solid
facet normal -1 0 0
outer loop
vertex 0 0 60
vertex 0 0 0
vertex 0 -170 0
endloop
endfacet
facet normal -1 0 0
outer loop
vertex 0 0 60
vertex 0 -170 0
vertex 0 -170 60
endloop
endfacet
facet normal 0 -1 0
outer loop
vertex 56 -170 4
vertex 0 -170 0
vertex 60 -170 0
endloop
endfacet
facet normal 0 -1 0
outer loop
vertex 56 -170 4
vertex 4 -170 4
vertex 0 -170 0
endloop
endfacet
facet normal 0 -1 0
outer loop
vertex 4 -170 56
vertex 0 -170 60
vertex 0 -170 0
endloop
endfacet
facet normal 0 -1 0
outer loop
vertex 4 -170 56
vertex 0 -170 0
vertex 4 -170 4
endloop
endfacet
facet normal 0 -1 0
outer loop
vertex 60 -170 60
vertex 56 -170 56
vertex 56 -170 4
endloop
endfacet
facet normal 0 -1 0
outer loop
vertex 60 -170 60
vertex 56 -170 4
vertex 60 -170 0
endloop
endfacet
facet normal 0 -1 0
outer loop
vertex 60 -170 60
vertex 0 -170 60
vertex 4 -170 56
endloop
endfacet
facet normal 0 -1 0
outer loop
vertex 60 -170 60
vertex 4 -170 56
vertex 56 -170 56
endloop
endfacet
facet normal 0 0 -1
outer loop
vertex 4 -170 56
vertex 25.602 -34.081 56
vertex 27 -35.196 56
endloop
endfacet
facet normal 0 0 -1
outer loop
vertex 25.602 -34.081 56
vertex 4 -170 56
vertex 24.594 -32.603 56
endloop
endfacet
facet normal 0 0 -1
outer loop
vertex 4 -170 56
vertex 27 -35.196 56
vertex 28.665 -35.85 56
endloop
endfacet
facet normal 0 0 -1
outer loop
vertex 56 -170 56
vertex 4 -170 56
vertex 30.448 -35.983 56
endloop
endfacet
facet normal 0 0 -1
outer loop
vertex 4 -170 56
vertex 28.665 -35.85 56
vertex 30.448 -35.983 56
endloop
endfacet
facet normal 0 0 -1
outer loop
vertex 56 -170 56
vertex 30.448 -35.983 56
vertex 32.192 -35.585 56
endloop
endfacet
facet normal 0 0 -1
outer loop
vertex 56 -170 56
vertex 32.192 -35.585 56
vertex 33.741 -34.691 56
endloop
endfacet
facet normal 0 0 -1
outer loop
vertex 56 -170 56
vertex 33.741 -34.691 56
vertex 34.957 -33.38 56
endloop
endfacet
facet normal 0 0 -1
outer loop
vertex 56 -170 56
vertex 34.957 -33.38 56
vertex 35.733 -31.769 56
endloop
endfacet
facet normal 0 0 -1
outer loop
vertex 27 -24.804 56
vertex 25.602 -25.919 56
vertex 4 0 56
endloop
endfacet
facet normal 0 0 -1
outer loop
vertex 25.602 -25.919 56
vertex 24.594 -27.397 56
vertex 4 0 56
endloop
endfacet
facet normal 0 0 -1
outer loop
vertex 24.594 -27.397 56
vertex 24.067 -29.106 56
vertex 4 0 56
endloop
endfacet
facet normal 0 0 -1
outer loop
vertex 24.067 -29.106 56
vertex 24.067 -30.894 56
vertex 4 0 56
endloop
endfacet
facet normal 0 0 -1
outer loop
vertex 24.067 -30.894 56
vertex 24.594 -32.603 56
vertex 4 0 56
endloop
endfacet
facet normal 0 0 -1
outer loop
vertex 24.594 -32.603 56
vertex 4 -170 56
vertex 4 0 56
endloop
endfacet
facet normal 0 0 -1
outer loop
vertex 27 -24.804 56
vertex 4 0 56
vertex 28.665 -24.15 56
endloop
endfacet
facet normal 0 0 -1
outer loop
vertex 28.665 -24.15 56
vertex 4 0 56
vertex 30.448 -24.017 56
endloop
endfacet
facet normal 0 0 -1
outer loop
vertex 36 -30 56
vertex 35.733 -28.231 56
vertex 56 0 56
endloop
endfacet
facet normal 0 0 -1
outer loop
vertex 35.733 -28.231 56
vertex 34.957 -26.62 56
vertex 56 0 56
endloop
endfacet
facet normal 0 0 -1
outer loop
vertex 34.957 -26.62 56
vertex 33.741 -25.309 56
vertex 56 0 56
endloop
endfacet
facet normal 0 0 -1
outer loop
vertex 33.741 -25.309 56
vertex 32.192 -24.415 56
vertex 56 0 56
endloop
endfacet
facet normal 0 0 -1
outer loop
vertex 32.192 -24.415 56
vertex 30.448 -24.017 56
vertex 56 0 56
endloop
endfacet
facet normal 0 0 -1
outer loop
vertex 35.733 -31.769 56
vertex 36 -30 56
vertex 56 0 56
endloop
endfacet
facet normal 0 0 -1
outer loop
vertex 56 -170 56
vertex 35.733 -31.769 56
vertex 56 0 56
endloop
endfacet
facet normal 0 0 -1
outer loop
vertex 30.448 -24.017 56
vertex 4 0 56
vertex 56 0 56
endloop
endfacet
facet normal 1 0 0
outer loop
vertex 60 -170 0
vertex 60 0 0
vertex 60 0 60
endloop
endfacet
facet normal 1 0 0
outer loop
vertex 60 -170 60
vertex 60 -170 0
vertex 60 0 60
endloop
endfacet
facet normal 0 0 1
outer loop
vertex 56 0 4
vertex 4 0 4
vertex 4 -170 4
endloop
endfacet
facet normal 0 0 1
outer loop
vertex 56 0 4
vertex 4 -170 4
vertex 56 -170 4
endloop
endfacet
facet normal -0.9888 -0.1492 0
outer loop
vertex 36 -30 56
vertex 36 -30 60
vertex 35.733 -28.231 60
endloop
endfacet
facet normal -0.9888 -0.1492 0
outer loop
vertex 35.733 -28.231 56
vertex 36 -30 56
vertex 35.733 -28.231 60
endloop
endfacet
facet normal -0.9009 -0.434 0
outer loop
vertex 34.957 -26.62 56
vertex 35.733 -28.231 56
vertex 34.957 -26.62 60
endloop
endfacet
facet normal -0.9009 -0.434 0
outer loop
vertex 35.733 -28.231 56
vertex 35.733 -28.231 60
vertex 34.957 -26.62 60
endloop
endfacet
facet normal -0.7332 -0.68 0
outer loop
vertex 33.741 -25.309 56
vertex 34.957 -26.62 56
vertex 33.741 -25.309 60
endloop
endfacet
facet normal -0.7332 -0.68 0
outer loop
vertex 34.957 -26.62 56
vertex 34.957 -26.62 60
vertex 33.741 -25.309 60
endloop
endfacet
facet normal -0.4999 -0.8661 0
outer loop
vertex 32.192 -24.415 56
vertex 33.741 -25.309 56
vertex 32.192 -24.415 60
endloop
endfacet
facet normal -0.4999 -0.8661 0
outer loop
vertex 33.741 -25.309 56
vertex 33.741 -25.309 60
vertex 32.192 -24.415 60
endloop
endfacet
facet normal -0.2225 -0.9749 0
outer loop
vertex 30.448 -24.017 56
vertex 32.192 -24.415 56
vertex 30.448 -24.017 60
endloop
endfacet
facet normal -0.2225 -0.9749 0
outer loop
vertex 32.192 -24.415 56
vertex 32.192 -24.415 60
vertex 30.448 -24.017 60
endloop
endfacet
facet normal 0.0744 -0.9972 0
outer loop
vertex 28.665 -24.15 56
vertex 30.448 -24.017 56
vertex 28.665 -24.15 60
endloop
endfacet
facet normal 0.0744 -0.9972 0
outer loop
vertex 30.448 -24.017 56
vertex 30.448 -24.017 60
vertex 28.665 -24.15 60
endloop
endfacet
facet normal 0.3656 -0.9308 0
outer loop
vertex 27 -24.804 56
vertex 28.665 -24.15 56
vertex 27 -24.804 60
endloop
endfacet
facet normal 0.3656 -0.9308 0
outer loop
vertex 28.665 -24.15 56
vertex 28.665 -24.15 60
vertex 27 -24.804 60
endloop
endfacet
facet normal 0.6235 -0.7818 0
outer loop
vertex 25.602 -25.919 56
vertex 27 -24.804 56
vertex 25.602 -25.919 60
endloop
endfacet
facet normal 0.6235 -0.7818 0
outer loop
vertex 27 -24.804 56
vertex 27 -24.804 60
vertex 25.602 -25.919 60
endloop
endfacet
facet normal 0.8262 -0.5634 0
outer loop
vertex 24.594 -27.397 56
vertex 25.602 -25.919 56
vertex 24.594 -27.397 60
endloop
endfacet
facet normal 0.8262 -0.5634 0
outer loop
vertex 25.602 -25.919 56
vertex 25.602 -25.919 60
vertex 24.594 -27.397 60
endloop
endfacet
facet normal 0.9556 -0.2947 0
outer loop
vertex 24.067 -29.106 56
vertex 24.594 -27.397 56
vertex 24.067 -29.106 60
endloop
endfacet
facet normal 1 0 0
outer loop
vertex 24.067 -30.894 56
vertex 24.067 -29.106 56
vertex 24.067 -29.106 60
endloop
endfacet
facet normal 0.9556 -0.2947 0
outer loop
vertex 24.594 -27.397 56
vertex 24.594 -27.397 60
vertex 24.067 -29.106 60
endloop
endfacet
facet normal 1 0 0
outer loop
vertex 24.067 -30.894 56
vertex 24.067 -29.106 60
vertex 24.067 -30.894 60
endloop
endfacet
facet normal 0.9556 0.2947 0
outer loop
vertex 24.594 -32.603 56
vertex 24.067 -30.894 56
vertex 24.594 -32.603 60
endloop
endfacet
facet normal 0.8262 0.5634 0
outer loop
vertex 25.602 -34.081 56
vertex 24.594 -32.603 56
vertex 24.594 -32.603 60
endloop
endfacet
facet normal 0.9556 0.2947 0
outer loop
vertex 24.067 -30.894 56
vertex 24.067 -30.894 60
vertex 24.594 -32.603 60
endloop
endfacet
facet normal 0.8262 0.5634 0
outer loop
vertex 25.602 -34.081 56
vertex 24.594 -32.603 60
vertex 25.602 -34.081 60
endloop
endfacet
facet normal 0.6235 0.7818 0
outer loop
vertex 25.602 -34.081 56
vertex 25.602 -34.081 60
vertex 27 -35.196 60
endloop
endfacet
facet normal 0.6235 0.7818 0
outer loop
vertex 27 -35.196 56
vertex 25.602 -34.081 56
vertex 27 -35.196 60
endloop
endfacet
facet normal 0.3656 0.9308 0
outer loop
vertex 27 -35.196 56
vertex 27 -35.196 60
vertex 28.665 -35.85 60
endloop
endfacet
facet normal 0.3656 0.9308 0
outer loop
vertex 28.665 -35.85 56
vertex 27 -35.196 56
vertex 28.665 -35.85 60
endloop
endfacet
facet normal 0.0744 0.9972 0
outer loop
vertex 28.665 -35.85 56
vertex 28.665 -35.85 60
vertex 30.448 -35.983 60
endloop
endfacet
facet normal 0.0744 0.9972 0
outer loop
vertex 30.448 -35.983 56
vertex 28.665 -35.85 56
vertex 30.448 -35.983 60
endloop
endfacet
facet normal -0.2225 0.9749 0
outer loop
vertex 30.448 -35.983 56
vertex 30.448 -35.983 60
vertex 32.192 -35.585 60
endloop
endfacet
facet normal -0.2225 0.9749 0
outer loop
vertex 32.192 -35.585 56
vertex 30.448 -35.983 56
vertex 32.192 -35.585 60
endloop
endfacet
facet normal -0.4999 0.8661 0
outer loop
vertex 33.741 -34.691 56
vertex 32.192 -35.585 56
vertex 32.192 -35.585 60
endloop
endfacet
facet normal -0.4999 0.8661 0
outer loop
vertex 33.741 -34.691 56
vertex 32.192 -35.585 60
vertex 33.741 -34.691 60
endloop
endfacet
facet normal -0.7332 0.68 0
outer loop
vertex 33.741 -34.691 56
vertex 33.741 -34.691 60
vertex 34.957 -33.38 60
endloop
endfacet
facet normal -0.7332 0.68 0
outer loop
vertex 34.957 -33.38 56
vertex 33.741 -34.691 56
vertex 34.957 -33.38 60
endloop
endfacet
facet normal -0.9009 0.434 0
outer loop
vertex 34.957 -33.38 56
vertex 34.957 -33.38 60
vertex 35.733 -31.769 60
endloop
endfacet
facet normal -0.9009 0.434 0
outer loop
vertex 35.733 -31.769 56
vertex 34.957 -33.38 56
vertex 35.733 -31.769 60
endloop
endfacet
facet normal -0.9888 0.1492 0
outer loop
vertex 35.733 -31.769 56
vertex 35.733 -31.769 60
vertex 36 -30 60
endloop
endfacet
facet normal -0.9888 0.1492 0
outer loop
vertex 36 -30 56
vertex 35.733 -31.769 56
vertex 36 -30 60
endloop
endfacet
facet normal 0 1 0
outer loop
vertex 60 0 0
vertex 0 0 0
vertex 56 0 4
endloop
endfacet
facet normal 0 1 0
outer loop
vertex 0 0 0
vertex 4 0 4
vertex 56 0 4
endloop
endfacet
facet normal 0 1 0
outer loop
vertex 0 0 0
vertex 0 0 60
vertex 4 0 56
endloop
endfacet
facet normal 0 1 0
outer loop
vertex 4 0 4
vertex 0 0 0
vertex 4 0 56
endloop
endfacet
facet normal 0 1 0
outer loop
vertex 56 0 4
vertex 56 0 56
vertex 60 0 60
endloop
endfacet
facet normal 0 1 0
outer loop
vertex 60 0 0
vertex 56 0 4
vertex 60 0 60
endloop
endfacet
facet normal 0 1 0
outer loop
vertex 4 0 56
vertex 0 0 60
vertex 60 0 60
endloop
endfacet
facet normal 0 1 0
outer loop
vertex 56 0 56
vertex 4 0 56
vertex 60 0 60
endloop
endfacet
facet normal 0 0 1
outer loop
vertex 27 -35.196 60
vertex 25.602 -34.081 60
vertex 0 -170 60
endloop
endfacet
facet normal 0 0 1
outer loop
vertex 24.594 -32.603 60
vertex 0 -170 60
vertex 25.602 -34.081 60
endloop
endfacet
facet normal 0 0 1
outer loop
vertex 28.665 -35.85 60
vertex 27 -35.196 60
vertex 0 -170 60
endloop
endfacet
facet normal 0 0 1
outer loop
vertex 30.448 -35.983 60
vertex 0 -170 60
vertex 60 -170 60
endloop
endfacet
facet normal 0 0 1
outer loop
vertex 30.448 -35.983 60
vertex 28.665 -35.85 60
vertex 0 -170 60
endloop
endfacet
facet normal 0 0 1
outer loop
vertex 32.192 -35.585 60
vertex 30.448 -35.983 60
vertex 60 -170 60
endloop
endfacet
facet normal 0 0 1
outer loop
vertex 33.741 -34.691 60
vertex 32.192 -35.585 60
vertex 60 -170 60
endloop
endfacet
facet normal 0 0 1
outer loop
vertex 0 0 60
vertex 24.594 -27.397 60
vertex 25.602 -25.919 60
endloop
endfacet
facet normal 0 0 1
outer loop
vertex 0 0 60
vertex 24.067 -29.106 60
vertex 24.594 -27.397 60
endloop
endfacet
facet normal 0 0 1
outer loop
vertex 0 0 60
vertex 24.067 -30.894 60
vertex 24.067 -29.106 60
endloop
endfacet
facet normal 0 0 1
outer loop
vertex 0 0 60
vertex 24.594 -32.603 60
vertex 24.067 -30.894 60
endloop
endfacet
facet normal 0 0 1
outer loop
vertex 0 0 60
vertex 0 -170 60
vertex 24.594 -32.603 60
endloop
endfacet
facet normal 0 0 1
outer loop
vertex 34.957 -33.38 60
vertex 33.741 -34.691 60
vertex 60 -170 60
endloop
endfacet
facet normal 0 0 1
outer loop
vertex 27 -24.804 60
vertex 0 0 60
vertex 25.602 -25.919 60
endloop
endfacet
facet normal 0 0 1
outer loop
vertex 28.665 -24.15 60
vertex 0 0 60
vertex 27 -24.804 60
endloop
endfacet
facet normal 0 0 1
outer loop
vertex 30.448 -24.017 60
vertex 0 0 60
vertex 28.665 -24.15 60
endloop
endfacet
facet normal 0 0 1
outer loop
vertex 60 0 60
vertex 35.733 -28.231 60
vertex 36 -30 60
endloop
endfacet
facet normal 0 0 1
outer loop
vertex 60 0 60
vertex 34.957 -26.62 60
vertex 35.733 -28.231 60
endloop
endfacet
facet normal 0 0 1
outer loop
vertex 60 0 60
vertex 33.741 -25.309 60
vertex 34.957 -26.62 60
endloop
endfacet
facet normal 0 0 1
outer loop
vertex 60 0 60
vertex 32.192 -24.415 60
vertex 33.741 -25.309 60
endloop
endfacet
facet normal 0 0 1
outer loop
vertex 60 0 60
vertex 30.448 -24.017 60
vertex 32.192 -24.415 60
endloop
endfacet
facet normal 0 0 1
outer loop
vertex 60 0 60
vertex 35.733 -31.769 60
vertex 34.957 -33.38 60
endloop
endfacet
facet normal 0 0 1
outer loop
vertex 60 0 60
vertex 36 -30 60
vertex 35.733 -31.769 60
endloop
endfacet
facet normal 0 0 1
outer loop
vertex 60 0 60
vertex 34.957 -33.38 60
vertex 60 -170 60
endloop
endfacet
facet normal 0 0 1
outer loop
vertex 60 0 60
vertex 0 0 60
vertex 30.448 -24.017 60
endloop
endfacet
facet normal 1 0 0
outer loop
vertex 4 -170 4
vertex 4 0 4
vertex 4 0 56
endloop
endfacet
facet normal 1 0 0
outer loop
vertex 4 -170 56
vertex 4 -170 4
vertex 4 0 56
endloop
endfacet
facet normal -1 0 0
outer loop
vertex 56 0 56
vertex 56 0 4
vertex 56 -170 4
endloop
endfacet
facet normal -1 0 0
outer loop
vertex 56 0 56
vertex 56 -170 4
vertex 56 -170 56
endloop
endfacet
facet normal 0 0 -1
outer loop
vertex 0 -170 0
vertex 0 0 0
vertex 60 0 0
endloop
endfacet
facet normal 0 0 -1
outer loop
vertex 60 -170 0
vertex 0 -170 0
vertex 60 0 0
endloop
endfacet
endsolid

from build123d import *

# Parameters (mm, degrees)
F0_W     = 60
F0_H     = 60
F0_W_2   = 52
F0_H_2   = 52
F1_DEPTH = 170
F2_R     = 6
F3_DEPTH = 10


with BuildPart() as f1:
    # F0 (on Front) → F1 (new body)
    with BuildSketch(Plane.XZ):
        with Locations((30, 30)):
            Rectangle(F0_W, F0_H)
        with Locations((30, 30)):
            Rectangle(F0_W_2, F0_H_2, mode=Mode.SUBTRACT)
    extrude(amount=F1_DEPTH)

    # F2 (on face) → F3 (cut)
    with BuildSketch(Plane.XY.offset(60)):
        with Locations((30, -30)):
            Circle(F2_R)
    extrude(amount=-F3_DEPTH, mode=Mode.SUBTRACT)


solid = f1.part
